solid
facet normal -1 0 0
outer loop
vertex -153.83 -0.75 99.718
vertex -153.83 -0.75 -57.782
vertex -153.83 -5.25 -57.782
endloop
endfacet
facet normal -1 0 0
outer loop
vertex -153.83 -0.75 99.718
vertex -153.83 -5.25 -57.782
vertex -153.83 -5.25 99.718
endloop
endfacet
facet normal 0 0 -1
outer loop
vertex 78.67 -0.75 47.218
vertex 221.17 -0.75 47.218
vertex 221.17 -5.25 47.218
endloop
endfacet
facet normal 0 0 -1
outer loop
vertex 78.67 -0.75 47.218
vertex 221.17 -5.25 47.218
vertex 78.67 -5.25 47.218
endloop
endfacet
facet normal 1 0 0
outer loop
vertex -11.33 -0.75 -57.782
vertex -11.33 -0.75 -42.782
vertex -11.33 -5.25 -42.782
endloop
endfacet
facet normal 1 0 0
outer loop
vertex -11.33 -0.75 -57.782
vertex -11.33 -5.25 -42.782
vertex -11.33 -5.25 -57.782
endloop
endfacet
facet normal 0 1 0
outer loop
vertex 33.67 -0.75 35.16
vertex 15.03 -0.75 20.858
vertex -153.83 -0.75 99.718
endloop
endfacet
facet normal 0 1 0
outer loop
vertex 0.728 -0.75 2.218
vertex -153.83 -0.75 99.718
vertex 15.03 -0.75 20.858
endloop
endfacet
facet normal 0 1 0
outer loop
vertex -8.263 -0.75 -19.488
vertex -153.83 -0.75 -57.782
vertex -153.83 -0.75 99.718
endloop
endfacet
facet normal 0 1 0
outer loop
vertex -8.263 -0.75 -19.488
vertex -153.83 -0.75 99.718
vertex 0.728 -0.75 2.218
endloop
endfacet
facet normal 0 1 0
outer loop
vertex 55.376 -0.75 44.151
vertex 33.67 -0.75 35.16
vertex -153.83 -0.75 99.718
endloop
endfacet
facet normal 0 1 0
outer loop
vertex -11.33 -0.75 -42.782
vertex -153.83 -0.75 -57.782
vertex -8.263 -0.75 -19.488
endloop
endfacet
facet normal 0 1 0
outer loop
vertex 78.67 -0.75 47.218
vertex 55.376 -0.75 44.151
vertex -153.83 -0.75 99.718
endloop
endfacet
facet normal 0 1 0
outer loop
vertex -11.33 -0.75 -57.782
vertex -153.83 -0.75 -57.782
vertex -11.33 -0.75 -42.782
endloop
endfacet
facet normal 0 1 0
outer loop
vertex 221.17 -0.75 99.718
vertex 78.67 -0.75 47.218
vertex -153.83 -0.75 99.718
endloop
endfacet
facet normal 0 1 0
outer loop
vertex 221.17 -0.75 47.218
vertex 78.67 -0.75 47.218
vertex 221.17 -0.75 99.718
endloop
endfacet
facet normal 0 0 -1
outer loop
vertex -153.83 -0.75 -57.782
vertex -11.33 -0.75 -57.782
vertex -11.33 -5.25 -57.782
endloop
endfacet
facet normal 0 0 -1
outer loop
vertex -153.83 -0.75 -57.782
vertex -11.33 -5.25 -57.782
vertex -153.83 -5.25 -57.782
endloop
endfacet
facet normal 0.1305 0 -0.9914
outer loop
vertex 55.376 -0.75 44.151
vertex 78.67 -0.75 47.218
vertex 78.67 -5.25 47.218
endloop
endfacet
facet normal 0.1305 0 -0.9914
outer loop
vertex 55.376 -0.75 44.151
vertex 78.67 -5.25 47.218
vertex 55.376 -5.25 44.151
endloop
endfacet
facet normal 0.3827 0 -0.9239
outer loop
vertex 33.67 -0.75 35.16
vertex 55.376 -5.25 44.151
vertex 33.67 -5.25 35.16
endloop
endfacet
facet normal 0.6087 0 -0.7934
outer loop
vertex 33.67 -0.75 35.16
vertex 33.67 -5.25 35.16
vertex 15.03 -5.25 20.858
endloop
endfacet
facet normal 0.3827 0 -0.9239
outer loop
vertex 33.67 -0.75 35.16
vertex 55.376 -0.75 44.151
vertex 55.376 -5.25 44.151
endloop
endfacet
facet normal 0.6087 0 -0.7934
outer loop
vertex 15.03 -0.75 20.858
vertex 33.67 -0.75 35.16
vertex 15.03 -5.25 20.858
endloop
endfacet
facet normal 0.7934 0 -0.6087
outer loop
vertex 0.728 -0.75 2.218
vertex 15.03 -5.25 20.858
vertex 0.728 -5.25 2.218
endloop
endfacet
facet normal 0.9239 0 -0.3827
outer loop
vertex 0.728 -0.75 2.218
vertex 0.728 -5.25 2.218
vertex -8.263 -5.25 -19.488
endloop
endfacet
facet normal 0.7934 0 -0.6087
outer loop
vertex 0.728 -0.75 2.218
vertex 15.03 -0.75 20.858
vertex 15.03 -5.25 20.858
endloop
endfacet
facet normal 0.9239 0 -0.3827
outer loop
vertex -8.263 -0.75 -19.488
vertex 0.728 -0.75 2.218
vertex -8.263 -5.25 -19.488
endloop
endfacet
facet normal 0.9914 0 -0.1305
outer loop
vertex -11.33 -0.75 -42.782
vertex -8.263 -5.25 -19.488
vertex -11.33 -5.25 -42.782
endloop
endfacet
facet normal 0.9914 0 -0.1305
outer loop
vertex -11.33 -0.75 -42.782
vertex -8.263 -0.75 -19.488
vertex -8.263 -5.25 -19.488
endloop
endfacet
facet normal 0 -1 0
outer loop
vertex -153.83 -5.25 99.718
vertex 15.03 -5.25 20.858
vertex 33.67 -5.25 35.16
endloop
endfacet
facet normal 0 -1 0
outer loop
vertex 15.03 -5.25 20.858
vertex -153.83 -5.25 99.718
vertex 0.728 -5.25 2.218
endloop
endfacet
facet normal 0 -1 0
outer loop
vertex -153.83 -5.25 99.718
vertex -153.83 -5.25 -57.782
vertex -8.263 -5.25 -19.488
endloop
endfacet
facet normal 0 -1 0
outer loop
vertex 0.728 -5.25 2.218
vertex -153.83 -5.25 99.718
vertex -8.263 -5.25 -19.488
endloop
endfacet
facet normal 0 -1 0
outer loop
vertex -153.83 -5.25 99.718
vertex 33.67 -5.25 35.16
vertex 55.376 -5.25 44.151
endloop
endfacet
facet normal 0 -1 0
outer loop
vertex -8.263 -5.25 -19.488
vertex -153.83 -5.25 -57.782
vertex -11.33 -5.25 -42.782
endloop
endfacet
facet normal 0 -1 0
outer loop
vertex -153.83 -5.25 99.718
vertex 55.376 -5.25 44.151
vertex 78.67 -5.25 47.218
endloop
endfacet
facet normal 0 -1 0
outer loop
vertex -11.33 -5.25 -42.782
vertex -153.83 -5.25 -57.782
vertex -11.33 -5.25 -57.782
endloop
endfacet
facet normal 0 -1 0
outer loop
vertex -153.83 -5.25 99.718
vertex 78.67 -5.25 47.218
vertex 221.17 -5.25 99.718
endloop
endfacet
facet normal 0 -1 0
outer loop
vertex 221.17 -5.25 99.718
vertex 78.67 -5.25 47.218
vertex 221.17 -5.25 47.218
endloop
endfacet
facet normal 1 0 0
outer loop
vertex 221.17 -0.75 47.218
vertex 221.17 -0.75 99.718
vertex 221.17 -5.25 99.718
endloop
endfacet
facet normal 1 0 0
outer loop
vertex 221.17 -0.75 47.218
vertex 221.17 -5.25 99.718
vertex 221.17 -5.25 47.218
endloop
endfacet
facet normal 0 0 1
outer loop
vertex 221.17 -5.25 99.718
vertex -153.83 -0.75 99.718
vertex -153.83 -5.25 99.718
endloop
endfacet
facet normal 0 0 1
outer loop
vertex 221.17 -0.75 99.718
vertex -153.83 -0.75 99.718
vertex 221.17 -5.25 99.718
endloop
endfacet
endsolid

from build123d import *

# Parameters (mm, degrees)
BOSS_EXTRUDE1_DEPTH = 6
SCALE1_SCALE        = 0.75


with BuildPart() as part:
    # Sketch1 → Boss-Extrude1 (new body)
    with BuildSketch(Plane(origin=(0, 0, 0), x_dir=(1, 0, 0), z_dir=(0, 1, 0))):
        with BuildLine():
            Line((-10, 70), (-10, 90))
            Line((-10, 90), (-200, 90))
            Line((-200, 90), (-200, -120))
            Line((-200, -120), (300, -120))
            Line((300, -120), (300, -50))
            Line((300, -50), (110, -50))
            ThreePointArc((110, -50), (25.147186258, -14.852813742), (-10, 70))
        make_face()
    extrude(amount=-BOSS_EXTRUDE1_DEPTH)


with BuildPart() as part_1:
    # Scale1: scaled about (-15.320244378, -3, 38.872638603)
    add(part.part.scale(SCALE1_SCALE).moved(Location((-3.830061094, -0.75, 9.718159651))))


solid = part_1.part
